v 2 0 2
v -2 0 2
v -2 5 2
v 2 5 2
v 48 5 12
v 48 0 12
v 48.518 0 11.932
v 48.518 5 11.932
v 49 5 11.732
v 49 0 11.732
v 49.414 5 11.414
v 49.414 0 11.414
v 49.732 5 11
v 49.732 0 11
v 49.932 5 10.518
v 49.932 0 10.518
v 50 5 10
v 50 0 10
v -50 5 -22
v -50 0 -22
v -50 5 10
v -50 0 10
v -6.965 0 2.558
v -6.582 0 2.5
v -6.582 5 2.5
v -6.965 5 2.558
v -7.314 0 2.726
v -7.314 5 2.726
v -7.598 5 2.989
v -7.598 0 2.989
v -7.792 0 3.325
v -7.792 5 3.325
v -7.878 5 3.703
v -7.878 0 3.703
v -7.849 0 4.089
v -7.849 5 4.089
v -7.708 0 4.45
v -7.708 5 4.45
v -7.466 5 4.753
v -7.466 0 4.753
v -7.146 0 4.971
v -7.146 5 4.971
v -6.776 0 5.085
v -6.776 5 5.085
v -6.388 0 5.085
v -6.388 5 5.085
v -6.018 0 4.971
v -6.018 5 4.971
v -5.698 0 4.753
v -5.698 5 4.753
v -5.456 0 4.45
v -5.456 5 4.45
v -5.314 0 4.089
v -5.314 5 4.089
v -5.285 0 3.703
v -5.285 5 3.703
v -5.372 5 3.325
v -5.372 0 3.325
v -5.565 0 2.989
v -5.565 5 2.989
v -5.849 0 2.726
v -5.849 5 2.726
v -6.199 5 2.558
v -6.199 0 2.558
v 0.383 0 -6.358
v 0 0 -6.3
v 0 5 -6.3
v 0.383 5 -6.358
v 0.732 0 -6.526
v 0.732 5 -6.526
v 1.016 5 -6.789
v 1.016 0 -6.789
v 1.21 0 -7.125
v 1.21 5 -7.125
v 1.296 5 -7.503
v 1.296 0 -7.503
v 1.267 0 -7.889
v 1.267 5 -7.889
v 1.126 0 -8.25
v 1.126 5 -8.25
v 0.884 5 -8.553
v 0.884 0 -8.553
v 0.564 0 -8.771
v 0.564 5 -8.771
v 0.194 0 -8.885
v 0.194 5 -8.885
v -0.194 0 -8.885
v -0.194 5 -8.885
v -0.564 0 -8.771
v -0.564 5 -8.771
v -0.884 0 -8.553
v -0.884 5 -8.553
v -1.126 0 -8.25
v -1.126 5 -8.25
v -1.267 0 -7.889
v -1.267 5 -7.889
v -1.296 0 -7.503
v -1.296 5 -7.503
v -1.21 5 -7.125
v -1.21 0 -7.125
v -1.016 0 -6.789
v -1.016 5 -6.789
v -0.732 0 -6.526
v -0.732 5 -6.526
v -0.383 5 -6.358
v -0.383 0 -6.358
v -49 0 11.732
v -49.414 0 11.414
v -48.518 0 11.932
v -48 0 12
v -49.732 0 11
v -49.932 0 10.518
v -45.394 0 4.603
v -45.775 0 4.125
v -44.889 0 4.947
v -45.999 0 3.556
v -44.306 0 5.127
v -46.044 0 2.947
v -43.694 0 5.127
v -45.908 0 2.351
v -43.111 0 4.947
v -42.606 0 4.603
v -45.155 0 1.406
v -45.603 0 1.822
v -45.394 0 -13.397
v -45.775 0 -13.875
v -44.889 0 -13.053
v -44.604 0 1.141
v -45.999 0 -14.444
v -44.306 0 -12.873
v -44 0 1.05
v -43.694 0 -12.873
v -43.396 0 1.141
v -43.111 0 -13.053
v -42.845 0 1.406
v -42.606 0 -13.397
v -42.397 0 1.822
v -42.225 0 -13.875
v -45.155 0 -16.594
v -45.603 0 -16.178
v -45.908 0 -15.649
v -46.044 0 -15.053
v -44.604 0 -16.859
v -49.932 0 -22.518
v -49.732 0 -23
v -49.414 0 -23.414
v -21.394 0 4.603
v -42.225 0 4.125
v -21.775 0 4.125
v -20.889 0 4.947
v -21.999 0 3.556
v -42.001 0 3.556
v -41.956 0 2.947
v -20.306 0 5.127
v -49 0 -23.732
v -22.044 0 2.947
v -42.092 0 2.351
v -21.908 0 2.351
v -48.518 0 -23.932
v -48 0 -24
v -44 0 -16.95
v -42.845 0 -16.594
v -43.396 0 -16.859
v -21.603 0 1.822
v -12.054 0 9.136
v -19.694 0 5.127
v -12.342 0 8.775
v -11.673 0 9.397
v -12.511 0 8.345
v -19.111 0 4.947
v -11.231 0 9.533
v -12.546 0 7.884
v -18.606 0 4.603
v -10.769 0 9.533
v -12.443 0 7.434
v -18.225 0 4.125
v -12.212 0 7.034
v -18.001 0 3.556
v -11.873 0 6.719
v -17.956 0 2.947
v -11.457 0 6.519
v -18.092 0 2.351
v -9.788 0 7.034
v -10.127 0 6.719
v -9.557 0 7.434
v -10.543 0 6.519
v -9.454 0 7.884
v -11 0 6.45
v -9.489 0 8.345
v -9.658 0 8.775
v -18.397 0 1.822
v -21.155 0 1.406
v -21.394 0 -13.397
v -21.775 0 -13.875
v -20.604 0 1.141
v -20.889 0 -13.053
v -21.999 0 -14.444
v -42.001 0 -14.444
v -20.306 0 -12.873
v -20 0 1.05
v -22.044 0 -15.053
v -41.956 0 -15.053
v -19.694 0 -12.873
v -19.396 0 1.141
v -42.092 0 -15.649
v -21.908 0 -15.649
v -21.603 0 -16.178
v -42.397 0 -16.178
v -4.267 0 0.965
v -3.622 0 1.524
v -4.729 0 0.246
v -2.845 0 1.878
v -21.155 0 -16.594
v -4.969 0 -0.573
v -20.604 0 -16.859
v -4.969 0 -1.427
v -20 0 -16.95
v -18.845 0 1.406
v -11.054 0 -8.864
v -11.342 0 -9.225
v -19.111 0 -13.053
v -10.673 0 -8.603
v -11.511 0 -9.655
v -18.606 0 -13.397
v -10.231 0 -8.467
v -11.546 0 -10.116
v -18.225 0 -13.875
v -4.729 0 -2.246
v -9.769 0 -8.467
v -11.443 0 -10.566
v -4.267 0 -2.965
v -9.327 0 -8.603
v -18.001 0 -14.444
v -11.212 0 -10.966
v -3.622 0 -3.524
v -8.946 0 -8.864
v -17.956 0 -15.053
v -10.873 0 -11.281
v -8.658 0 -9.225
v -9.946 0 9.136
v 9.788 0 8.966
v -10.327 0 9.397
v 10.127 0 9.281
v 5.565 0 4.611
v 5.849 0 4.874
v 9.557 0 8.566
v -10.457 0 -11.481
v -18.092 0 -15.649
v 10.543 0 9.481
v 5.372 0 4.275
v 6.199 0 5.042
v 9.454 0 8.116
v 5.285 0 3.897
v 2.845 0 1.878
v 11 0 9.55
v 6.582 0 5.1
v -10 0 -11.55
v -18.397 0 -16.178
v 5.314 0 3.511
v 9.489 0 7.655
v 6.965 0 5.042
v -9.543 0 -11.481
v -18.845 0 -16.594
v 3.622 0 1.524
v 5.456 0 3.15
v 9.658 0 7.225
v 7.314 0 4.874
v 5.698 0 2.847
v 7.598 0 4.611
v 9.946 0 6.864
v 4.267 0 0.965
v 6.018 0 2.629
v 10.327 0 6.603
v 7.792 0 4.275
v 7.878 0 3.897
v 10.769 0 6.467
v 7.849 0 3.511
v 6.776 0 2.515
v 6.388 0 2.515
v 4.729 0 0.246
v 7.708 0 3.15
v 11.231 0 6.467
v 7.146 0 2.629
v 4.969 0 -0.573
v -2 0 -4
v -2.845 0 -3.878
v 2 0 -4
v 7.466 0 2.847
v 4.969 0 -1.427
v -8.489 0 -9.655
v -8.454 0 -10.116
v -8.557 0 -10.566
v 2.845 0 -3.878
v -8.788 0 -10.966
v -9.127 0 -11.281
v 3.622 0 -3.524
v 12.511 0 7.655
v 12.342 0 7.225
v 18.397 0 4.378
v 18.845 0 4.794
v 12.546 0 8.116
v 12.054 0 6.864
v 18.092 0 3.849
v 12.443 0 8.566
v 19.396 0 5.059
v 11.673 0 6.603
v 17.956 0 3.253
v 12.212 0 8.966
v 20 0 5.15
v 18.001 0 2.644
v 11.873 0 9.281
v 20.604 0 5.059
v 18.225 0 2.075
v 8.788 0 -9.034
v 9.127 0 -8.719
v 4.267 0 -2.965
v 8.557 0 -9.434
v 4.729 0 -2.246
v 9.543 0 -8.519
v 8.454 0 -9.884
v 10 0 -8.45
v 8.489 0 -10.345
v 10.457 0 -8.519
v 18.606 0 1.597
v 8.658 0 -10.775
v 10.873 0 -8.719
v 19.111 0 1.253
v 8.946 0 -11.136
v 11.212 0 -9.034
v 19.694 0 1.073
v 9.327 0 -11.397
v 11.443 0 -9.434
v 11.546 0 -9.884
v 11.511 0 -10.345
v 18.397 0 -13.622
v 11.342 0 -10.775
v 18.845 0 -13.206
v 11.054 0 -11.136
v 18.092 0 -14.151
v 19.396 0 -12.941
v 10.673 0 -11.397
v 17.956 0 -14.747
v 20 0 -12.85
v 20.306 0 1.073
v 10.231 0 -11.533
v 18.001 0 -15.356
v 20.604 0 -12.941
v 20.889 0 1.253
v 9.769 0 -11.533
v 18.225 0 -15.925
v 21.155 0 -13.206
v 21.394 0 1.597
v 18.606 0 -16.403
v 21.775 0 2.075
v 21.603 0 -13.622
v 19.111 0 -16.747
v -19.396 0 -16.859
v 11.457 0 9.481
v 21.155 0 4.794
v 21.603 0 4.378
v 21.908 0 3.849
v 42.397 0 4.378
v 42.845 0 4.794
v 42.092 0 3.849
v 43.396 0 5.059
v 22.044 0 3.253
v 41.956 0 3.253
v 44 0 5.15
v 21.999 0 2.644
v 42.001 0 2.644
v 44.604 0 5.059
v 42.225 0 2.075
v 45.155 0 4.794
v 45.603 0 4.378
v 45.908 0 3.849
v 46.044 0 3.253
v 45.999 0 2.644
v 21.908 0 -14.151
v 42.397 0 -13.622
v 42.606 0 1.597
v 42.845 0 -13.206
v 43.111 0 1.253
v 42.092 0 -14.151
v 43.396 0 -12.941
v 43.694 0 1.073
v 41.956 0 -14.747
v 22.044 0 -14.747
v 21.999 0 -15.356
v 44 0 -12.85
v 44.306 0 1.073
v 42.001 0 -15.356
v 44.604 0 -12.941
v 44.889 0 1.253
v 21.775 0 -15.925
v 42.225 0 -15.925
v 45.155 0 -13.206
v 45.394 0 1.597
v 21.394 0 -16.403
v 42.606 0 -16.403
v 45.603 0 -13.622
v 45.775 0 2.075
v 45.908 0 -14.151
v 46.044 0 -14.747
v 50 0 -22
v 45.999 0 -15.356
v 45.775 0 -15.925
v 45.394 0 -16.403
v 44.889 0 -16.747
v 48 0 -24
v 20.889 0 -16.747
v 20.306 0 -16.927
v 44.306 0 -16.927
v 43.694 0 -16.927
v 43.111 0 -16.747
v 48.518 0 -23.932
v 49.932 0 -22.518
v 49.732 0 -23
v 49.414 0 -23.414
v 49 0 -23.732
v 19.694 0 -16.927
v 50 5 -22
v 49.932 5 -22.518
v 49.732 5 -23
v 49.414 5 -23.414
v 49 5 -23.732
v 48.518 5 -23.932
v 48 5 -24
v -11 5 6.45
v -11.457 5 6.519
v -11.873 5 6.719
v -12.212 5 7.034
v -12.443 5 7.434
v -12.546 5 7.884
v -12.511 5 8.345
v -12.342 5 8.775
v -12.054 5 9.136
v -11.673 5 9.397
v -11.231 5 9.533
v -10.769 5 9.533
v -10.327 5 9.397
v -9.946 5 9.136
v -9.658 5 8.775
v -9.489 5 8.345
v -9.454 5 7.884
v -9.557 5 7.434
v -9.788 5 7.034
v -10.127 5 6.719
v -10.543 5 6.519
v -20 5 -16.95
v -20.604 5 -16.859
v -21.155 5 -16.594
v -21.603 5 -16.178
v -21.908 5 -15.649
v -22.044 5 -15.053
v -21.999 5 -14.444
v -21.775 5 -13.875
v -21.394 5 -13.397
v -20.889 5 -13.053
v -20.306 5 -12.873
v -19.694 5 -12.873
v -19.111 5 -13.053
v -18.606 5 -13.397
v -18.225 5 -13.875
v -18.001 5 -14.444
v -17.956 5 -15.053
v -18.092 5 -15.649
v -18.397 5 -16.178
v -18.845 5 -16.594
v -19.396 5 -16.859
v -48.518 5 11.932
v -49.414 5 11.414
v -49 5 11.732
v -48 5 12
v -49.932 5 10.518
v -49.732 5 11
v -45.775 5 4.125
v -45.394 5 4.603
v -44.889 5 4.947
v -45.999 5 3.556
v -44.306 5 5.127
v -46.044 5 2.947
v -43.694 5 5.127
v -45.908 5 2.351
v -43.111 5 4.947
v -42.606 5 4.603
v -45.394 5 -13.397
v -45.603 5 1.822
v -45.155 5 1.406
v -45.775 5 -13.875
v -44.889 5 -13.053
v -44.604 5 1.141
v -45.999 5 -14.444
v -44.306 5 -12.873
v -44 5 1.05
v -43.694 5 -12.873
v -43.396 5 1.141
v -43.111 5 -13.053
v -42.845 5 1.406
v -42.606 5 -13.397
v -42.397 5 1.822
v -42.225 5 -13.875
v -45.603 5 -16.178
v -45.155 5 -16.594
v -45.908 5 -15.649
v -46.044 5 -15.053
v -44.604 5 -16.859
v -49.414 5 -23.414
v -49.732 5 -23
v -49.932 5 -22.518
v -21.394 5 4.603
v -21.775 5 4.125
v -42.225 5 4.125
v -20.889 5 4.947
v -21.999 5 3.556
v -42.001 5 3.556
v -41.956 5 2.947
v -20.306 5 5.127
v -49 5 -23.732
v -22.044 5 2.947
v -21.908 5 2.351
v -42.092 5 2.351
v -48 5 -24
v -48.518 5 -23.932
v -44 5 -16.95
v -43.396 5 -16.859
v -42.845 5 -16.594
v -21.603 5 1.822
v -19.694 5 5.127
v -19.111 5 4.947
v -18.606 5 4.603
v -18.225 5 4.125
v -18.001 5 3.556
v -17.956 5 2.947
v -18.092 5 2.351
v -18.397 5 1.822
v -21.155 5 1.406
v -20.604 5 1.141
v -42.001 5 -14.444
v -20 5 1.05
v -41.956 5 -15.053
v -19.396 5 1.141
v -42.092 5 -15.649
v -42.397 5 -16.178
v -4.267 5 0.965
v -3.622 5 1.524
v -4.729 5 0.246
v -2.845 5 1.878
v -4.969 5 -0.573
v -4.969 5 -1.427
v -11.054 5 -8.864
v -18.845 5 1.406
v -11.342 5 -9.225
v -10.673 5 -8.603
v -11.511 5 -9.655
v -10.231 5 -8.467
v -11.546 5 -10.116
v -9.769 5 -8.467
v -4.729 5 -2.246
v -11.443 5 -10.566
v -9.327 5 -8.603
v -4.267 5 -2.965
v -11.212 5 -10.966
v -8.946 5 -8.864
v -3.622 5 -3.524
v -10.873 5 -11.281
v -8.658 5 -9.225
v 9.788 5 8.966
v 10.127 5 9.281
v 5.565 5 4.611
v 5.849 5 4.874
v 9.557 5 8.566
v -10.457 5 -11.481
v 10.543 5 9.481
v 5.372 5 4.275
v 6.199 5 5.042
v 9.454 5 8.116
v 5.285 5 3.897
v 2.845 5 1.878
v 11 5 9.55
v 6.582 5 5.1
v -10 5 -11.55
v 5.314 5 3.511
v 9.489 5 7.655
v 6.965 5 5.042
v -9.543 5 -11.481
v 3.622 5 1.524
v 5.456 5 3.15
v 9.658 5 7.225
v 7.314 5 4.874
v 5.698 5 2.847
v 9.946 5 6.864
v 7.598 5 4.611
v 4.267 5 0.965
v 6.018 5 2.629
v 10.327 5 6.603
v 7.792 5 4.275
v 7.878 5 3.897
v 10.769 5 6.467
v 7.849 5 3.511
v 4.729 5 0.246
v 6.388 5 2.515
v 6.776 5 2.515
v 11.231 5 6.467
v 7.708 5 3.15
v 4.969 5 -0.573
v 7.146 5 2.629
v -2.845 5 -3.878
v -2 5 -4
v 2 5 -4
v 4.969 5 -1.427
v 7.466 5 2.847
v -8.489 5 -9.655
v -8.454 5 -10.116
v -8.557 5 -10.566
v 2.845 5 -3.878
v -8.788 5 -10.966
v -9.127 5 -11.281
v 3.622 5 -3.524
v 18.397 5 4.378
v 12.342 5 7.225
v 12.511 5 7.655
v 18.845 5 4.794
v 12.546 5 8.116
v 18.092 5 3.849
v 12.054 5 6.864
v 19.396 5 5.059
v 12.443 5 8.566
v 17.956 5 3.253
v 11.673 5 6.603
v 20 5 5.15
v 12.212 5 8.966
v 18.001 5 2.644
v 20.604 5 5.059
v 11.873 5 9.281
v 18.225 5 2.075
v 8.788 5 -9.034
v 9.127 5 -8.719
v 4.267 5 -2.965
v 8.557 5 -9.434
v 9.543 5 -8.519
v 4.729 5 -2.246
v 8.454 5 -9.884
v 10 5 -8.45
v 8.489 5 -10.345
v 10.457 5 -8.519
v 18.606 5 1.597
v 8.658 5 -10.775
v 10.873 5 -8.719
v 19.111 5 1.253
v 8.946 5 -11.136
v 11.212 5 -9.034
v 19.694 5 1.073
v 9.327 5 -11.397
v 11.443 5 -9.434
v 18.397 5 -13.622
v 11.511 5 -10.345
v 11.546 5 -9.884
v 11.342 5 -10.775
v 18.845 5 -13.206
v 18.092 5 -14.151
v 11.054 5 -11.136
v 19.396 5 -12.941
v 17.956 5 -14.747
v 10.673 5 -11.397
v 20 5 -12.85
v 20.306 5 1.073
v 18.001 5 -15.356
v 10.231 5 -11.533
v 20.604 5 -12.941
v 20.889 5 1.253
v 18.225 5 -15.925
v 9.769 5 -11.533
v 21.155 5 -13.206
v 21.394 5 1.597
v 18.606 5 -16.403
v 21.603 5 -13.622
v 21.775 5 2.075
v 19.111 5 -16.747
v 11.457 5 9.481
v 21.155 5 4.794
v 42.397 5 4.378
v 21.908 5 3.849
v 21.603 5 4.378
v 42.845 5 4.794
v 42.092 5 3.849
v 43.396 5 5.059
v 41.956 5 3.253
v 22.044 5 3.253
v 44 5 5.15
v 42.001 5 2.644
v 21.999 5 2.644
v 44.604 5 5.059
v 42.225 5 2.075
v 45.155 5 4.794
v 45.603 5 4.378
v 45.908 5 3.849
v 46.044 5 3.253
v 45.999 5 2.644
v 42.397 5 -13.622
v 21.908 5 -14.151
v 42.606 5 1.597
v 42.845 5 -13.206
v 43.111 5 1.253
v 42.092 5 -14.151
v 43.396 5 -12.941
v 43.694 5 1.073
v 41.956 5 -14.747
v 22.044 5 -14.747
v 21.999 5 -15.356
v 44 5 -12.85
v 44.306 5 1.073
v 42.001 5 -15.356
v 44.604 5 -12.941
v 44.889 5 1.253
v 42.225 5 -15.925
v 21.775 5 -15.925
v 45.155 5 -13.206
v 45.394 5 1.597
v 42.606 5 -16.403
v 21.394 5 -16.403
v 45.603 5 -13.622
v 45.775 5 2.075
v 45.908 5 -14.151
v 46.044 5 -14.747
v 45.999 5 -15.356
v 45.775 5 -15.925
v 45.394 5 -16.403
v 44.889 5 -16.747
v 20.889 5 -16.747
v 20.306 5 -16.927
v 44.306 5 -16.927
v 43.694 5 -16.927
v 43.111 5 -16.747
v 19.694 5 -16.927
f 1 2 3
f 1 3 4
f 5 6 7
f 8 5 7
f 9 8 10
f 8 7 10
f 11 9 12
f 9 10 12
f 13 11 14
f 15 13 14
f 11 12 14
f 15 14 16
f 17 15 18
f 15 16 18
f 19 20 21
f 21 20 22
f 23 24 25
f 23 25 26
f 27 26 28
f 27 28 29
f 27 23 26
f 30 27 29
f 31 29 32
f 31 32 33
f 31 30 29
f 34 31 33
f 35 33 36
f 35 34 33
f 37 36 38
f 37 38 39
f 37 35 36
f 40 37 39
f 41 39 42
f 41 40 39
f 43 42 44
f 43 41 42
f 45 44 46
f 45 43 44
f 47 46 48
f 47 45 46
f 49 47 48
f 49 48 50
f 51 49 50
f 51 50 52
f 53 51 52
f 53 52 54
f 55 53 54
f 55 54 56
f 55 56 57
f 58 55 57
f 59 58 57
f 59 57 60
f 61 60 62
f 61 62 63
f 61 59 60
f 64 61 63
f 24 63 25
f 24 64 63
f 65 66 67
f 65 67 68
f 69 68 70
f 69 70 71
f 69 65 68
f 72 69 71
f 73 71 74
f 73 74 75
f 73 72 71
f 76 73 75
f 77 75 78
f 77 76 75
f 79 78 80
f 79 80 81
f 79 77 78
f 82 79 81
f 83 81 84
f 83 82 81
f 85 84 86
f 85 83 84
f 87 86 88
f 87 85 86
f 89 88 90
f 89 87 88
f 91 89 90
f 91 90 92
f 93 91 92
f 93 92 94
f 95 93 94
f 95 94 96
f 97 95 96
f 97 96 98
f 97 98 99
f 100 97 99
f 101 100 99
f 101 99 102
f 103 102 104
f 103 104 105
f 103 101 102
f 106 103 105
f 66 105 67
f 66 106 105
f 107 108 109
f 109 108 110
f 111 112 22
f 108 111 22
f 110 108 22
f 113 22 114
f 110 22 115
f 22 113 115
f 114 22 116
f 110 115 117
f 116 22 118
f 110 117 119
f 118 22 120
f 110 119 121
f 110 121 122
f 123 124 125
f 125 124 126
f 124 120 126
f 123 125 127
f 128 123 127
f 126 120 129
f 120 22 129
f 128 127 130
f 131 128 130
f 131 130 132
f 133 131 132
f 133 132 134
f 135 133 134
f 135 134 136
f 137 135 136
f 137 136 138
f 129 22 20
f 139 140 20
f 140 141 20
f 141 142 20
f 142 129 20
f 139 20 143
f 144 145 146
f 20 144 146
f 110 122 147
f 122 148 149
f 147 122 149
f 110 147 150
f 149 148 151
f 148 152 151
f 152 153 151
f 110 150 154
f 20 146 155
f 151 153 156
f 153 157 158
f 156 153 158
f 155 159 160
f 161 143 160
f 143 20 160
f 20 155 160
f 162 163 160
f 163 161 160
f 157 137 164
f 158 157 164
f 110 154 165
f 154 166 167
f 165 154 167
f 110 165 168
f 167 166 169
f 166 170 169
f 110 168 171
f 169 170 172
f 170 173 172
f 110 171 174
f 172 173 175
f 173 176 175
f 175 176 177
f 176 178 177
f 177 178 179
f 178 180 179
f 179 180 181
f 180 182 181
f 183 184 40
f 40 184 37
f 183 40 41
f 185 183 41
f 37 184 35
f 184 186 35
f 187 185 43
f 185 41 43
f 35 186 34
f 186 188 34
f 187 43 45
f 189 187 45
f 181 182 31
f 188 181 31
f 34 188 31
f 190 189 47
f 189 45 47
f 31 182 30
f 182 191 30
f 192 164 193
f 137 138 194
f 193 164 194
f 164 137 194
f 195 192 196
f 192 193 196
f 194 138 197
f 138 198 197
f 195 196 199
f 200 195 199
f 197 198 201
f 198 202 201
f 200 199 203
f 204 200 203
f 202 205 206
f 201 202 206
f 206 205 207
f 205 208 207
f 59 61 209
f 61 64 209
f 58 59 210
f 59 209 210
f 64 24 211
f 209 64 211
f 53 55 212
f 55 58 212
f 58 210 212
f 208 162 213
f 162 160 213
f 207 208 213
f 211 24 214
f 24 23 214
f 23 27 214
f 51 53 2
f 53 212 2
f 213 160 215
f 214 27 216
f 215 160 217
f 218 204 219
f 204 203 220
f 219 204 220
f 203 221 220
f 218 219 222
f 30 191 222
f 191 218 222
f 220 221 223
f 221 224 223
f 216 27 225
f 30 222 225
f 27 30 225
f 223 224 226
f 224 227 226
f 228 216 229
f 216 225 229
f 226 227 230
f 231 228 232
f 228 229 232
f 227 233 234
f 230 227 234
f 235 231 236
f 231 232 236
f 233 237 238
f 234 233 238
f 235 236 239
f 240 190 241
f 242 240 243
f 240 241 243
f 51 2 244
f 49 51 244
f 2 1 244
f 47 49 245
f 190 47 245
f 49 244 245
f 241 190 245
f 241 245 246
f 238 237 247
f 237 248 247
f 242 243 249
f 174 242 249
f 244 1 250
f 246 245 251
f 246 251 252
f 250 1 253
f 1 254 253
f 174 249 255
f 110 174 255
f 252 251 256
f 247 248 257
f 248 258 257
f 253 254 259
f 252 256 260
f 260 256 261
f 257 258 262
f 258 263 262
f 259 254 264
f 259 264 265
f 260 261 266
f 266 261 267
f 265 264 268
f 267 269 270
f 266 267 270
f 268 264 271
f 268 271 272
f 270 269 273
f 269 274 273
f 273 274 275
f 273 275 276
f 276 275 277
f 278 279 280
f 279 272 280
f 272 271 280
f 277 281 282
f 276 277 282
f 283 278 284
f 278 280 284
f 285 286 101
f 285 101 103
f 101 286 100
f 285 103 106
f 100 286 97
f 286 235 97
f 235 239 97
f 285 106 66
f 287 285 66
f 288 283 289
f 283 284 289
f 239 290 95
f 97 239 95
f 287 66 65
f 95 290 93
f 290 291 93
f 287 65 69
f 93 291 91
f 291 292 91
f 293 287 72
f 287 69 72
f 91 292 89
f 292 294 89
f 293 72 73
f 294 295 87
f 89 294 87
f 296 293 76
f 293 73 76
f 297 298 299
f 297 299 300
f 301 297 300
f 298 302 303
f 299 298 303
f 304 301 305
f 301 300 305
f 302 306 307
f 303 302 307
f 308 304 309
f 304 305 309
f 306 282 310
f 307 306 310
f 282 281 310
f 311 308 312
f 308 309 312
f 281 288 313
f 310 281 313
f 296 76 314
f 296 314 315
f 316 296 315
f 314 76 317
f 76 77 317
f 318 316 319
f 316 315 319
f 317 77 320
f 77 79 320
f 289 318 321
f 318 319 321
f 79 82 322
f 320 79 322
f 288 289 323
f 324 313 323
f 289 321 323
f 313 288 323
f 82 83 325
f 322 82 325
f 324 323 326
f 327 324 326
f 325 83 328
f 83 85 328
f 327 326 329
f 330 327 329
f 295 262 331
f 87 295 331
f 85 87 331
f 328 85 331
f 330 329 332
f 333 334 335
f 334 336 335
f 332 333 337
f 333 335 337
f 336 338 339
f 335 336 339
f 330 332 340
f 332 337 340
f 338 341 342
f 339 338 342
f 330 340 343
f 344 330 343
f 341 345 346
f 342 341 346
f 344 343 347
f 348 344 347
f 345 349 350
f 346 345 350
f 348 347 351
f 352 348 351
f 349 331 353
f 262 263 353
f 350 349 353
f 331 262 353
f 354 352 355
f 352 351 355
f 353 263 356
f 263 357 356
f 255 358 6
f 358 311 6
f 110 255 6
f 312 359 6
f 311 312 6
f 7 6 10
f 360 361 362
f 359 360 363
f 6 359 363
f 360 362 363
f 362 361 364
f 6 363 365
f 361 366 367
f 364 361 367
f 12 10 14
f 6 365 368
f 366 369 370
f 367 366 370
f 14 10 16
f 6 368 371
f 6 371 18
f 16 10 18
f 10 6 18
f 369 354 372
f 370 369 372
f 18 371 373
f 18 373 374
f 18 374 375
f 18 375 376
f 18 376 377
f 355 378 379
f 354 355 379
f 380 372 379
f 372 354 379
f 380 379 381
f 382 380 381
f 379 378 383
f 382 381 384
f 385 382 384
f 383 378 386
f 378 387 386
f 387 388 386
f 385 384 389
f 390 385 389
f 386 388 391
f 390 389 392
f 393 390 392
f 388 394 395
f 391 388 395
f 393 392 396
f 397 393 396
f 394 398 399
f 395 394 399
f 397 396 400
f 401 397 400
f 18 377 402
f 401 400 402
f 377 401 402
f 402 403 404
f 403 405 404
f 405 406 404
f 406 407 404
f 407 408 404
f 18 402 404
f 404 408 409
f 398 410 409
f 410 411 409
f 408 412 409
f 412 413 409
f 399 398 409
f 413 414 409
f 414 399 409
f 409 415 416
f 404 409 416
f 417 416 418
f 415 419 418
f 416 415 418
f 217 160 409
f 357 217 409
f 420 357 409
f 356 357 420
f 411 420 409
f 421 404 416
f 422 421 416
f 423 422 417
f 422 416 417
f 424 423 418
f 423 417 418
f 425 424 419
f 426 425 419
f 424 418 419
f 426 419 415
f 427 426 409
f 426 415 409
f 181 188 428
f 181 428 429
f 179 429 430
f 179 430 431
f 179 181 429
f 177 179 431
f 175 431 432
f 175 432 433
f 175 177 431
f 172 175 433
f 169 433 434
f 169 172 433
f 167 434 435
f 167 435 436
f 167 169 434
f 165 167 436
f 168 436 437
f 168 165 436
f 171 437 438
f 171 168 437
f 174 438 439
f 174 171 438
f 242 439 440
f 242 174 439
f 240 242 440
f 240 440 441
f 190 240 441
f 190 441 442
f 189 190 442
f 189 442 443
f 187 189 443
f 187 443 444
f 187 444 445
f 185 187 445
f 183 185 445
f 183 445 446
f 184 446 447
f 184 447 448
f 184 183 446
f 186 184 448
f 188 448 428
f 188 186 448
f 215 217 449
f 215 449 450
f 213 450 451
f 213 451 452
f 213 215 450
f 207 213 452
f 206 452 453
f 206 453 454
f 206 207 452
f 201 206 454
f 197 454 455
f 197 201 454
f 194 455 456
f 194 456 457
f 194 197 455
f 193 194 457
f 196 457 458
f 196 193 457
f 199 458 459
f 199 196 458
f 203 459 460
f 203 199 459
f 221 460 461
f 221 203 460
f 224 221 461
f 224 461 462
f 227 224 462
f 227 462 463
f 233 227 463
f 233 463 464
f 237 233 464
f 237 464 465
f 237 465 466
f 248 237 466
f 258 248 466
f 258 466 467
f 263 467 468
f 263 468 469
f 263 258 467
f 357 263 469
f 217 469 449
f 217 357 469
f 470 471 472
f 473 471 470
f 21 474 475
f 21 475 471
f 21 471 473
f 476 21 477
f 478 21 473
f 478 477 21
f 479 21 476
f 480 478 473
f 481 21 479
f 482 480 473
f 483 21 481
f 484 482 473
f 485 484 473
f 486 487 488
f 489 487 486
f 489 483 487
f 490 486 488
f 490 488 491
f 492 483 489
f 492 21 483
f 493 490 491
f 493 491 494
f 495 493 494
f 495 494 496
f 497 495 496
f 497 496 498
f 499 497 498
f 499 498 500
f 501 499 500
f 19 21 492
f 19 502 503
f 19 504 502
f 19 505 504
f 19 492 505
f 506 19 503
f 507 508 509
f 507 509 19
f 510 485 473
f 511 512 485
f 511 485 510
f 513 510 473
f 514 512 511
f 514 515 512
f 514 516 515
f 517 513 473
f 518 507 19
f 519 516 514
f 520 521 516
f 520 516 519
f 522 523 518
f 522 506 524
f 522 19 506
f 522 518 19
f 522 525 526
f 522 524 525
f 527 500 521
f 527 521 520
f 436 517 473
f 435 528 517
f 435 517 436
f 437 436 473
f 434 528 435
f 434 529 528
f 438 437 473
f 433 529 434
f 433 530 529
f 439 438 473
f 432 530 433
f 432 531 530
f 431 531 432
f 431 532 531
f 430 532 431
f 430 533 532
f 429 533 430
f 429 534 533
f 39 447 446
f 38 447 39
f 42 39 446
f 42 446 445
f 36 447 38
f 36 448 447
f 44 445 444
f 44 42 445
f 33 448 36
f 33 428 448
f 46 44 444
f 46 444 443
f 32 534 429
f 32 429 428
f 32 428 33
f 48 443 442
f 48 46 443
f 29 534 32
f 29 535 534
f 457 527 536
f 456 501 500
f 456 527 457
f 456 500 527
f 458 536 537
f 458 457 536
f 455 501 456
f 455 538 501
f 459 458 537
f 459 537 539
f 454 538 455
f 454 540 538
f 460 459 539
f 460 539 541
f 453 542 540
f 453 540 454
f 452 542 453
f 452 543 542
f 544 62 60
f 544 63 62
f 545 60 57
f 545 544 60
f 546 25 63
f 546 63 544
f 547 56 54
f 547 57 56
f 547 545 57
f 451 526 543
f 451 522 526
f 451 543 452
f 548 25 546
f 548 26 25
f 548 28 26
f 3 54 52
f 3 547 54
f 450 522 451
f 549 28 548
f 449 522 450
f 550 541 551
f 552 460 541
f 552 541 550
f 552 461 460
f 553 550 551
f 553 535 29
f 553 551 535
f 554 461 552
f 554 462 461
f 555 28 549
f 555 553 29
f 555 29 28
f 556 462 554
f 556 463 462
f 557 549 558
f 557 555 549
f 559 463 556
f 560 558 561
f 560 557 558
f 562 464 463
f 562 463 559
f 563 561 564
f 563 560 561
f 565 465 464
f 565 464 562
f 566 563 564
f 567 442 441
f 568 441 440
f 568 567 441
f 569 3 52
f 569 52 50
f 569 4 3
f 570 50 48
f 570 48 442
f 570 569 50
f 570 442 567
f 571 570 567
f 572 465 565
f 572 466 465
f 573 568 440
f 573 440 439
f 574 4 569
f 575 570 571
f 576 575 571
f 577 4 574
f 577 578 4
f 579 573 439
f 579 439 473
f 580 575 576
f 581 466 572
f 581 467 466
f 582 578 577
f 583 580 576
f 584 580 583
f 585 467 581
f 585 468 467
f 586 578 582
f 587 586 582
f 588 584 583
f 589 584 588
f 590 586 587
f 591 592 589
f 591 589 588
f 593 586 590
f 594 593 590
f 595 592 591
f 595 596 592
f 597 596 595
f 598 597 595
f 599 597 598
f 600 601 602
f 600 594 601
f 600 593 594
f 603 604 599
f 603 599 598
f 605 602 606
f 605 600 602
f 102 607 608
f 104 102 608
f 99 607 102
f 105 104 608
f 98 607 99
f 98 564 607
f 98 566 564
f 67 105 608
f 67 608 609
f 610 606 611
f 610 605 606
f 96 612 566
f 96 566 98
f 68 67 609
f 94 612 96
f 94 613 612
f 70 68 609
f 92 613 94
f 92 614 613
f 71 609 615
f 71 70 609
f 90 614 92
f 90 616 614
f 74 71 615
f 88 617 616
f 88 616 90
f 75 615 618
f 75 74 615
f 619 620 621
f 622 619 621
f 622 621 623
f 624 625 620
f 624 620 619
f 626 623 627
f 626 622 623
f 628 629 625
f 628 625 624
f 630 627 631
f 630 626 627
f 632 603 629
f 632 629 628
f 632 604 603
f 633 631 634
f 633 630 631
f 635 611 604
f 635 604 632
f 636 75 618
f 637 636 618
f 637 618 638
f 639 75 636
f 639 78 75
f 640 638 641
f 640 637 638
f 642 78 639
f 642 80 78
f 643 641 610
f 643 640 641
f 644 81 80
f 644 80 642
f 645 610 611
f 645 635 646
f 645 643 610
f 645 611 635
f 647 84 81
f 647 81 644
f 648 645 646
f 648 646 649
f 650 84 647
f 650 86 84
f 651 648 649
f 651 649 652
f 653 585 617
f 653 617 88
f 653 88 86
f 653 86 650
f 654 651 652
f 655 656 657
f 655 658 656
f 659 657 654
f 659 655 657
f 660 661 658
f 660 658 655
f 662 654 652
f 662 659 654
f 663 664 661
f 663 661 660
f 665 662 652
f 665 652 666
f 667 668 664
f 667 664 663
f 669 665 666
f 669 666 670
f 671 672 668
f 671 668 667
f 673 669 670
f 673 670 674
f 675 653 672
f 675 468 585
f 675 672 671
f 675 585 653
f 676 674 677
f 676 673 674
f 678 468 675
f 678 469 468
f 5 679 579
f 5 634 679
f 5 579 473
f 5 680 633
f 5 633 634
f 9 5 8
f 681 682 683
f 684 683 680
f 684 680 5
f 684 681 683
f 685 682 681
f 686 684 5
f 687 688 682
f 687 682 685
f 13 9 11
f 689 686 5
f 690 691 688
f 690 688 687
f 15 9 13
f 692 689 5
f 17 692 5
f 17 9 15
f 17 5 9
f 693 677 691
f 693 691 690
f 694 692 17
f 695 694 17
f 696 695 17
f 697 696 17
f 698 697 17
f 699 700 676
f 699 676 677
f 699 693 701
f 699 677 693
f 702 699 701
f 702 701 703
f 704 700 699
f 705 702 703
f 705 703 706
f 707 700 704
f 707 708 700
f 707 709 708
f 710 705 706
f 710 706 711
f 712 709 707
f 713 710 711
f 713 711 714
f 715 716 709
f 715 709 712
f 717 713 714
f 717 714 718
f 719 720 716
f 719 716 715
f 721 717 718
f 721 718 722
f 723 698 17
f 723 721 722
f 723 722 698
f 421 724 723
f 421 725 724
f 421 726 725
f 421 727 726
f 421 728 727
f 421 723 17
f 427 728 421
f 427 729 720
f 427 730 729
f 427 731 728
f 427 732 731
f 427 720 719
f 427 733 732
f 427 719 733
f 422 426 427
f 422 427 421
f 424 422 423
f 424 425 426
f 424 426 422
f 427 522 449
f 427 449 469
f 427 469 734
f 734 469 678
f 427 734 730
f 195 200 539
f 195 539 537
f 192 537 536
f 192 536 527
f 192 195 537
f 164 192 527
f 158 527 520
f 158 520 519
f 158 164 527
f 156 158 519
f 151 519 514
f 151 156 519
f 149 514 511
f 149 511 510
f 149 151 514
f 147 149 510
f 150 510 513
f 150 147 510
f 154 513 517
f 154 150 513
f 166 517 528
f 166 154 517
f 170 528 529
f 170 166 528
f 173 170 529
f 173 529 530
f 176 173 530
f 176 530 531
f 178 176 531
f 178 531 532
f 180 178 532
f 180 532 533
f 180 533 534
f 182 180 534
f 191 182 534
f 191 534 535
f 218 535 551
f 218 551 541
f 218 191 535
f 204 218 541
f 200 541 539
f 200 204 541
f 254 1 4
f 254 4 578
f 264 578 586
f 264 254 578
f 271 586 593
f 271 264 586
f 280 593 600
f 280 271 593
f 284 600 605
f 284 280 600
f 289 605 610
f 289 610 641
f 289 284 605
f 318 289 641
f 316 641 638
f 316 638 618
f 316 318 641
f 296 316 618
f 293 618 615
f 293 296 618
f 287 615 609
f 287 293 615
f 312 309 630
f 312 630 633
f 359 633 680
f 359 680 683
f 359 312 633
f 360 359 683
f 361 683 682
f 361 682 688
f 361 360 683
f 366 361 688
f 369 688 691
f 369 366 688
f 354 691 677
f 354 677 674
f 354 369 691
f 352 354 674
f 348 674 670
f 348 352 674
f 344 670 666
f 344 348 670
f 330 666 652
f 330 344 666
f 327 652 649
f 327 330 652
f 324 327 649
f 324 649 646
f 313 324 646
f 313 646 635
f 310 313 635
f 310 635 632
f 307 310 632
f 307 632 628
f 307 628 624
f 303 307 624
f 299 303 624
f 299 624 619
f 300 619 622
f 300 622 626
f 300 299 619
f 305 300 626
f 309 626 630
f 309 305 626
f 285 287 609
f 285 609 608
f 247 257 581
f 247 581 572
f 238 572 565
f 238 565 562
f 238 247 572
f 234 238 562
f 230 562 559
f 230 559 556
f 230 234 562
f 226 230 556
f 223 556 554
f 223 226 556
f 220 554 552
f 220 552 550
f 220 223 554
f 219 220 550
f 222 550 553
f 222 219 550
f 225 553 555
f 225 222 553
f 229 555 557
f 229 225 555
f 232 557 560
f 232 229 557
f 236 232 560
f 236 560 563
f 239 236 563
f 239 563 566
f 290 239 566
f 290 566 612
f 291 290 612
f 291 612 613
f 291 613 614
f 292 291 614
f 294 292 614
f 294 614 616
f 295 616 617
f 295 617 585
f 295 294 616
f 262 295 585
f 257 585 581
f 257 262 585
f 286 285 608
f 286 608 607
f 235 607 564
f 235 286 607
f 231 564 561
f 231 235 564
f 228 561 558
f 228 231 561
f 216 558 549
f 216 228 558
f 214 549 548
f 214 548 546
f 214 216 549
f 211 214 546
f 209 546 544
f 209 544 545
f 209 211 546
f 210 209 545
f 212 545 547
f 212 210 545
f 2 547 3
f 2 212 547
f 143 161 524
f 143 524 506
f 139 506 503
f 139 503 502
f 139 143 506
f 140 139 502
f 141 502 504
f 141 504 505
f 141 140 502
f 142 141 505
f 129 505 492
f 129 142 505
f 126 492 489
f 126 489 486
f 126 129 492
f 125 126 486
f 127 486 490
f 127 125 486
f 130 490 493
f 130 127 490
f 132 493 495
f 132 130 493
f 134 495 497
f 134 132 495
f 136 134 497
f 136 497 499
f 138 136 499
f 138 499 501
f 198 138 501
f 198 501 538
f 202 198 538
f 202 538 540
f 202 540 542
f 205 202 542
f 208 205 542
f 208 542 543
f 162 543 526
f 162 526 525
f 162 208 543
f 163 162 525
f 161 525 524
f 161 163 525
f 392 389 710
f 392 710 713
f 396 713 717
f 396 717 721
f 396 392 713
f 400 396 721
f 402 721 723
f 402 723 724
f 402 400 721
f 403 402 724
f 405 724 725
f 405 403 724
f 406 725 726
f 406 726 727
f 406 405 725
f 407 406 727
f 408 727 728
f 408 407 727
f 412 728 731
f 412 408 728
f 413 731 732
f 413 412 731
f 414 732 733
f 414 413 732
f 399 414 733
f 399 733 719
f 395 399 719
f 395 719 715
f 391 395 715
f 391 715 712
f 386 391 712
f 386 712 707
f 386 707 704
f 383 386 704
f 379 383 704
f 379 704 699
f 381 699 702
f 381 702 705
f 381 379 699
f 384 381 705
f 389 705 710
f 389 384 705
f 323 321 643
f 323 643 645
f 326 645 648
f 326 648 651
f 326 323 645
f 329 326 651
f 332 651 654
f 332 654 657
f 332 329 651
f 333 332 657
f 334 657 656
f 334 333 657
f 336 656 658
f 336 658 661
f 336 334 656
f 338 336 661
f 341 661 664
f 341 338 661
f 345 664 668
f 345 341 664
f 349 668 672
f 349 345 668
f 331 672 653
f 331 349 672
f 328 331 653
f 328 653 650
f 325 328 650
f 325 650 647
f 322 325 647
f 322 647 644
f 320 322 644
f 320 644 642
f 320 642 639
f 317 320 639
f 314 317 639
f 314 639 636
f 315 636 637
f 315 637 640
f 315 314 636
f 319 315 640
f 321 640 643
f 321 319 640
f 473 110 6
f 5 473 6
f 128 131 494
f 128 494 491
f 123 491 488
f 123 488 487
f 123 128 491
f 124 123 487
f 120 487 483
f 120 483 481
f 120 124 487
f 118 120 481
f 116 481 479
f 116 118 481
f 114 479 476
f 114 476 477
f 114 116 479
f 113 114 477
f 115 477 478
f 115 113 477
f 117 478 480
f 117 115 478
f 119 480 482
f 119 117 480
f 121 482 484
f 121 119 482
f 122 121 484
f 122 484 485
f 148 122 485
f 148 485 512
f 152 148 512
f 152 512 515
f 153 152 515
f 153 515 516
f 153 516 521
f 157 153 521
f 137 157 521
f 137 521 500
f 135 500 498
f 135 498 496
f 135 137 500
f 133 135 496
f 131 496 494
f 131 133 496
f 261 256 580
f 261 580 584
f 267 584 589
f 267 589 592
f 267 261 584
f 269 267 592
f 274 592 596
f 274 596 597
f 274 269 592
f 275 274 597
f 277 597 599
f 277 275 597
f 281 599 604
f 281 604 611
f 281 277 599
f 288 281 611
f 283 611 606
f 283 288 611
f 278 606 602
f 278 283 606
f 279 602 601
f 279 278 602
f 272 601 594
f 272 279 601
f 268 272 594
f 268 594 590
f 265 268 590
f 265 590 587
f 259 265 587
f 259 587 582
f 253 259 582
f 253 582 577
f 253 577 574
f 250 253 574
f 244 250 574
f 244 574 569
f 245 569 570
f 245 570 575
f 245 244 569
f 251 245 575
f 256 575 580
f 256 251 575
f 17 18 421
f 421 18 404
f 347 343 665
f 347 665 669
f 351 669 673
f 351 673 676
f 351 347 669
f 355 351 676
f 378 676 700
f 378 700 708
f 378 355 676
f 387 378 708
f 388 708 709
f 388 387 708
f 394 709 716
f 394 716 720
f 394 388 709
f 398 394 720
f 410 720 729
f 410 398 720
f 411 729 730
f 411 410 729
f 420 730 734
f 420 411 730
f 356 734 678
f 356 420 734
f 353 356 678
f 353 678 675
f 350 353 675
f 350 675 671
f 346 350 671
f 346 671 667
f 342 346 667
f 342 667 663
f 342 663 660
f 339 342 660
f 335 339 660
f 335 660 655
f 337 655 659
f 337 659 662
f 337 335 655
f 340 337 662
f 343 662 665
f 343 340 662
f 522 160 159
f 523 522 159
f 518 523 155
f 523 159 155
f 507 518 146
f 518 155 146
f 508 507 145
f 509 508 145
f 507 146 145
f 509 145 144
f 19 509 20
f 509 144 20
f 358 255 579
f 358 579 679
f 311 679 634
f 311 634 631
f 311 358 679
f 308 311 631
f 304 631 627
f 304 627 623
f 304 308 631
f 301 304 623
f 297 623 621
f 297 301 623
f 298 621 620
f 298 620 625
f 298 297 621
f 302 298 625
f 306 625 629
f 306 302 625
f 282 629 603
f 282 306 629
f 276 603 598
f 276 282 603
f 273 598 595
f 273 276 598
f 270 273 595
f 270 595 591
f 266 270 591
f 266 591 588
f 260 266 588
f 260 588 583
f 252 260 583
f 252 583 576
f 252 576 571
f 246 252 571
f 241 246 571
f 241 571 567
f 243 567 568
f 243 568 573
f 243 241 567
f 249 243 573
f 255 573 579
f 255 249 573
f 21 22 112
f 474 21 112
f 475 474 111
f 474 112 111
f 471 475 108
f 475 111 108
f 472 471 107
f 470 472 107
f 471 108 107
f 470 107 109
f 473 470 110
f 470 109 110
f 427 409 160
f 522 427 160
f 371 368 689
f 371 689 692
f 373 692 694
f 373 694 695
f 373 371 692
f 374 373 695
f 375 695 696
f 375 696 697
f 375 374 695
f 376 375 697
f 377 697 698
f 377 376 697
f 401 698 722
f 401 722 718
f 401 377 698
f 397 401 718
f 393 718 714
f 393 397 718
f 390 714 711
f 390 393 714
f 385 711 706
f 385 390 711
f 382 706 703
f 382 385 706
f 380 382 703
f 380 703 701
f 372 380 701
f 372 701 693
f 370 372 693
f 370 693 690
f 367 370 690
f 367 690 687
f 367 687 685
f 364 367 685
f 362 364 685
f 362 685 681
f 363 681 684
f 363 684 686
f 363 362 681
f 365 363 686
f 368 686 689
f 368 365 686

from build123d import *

# Parameters (mm, degrees)
SKETCH1_R           = 1.3
SKETCH1_R_2         = 2.05
SKETCH1_R_3         = 1.55
BOSS_EXTRUDE1_DEPTH = 5


with BuildPart() as part:
    # Sketch1 → Boss-Extrude1 (new body)
    with BuildSketch(Plane(origin=(0, 0, 0), x_dir=(1, 0, 0), z_dir=(0, 1, 0))):
        with BuildLine():
            Line((-48, -12), (48, -12))
            ThreePointArc((48, -12), (49.414213562, -11.414213562), (50, -10))
            Line((50, -10), (50, 22))
            ThreePointArc((50, 22), (49.414213562, 23.414213562), (48, 24))
            Line((48, 24), (-48, 24))
            ThreePointArc((-48, 24), (-49.414213562, 23.414213562), (-50, 22))
            Line((-50, 22), (-50, -10))
            ThreePointArc((-50, -10), (-49.414213562, -11.414213562), (-48, -12))
        make_face()
        with Locations(Location((0, 7.6, 0), (0, 0, 270))):
            Circle(SKETCH1_R, mode=Mode.SUBTRACT)
        with Locations(Location((6.581793069, -3.8, 0), (0, 0, 270))):
            Circle(SKETCH1_R, mode=Mode.SUBTRACT)
        with Locations(Location((-6.581793069, -3.8, 0), (0, 0, 90))):
            Circle(SKETCH1_R, mode=Mode.SUBTRACT)
        with Locations(Location((44, 14.9, 0), (0, 0, 270))):
            Circle(SKETCH1_R_2, mode=Mode.SUBTRACT)
        with Locations(Location((20, 14.9, 0), (0, 0, 270))):
            Circle(SKETCH1_R_2, mode=Mode.SUBTRACT)
        with Locations(Location((44, -3.1, 0), (0, 0, 270))):
            Circle(SKETCH1_R_2, mode=Mode.SUBTRACT)
        with Locations(Location((20, -3.1, 0), (0, 0, 270))):
            Circle(SKETCH1_R_2, mode=Mode.SUBTRACT)
        with Locations(Location((-44, -3.1, 0), (0, 0, 90))):
            Circle(SKETCH1_R_2, mode=Mode.SUBTRACT)
        with Locations(Location((-20, -3.1, 0), (0, 0, 90))):
            Circle(SKETCH1_R_2, mode=Mode.SUBTRACT)
        with Locations(Location((-20, 14.9, 0), (0, 0, 90))):
            Circle(SKETCH1_R_2, mode=Mode.SUBTRACT)
        with Locations(Location((-44, 14.9, 0), (0, 0, 90))):
            Circle(SKETCH1_R_2, mode=Mode.SUBTRACT)
        with Locations(Location((11, -8, 0), (0, 0, 270))):
            Circle(SKETCH1_R_3, mode=Mode.SUBTRACT)
        with Locations(Location((10, 10, 0), (0, 0, 270))):
            Circle(SKETCH1_R_3, mode=Mode.SUBTRACT)
        with Locations(Location((-11, -8, 0), (0, 0, 90))):
            Circle(SKETCH1_R_3, mode=Mode.SUBTRACT)
        with Locations(Location((-10, 10, 0), (0, 0, 90))):
            Circle(SKETCH1_R_3, mode=Mode.SUBTRACT)
        with BuildLine():
            Line((2, 4), (-2, 4))
            ThreePointArc((-2, 4), (-5, 1), (-2, -2))
            Line((-2, -2), (2, -2))
            ThreePointArc((2, -2), (5, 1), (2, 4))
        make_face(mode=Mode.SUBTRACT)
    extrude(amount=BOSS_EXTRUDE1_DEPTH)


solid = part.part
